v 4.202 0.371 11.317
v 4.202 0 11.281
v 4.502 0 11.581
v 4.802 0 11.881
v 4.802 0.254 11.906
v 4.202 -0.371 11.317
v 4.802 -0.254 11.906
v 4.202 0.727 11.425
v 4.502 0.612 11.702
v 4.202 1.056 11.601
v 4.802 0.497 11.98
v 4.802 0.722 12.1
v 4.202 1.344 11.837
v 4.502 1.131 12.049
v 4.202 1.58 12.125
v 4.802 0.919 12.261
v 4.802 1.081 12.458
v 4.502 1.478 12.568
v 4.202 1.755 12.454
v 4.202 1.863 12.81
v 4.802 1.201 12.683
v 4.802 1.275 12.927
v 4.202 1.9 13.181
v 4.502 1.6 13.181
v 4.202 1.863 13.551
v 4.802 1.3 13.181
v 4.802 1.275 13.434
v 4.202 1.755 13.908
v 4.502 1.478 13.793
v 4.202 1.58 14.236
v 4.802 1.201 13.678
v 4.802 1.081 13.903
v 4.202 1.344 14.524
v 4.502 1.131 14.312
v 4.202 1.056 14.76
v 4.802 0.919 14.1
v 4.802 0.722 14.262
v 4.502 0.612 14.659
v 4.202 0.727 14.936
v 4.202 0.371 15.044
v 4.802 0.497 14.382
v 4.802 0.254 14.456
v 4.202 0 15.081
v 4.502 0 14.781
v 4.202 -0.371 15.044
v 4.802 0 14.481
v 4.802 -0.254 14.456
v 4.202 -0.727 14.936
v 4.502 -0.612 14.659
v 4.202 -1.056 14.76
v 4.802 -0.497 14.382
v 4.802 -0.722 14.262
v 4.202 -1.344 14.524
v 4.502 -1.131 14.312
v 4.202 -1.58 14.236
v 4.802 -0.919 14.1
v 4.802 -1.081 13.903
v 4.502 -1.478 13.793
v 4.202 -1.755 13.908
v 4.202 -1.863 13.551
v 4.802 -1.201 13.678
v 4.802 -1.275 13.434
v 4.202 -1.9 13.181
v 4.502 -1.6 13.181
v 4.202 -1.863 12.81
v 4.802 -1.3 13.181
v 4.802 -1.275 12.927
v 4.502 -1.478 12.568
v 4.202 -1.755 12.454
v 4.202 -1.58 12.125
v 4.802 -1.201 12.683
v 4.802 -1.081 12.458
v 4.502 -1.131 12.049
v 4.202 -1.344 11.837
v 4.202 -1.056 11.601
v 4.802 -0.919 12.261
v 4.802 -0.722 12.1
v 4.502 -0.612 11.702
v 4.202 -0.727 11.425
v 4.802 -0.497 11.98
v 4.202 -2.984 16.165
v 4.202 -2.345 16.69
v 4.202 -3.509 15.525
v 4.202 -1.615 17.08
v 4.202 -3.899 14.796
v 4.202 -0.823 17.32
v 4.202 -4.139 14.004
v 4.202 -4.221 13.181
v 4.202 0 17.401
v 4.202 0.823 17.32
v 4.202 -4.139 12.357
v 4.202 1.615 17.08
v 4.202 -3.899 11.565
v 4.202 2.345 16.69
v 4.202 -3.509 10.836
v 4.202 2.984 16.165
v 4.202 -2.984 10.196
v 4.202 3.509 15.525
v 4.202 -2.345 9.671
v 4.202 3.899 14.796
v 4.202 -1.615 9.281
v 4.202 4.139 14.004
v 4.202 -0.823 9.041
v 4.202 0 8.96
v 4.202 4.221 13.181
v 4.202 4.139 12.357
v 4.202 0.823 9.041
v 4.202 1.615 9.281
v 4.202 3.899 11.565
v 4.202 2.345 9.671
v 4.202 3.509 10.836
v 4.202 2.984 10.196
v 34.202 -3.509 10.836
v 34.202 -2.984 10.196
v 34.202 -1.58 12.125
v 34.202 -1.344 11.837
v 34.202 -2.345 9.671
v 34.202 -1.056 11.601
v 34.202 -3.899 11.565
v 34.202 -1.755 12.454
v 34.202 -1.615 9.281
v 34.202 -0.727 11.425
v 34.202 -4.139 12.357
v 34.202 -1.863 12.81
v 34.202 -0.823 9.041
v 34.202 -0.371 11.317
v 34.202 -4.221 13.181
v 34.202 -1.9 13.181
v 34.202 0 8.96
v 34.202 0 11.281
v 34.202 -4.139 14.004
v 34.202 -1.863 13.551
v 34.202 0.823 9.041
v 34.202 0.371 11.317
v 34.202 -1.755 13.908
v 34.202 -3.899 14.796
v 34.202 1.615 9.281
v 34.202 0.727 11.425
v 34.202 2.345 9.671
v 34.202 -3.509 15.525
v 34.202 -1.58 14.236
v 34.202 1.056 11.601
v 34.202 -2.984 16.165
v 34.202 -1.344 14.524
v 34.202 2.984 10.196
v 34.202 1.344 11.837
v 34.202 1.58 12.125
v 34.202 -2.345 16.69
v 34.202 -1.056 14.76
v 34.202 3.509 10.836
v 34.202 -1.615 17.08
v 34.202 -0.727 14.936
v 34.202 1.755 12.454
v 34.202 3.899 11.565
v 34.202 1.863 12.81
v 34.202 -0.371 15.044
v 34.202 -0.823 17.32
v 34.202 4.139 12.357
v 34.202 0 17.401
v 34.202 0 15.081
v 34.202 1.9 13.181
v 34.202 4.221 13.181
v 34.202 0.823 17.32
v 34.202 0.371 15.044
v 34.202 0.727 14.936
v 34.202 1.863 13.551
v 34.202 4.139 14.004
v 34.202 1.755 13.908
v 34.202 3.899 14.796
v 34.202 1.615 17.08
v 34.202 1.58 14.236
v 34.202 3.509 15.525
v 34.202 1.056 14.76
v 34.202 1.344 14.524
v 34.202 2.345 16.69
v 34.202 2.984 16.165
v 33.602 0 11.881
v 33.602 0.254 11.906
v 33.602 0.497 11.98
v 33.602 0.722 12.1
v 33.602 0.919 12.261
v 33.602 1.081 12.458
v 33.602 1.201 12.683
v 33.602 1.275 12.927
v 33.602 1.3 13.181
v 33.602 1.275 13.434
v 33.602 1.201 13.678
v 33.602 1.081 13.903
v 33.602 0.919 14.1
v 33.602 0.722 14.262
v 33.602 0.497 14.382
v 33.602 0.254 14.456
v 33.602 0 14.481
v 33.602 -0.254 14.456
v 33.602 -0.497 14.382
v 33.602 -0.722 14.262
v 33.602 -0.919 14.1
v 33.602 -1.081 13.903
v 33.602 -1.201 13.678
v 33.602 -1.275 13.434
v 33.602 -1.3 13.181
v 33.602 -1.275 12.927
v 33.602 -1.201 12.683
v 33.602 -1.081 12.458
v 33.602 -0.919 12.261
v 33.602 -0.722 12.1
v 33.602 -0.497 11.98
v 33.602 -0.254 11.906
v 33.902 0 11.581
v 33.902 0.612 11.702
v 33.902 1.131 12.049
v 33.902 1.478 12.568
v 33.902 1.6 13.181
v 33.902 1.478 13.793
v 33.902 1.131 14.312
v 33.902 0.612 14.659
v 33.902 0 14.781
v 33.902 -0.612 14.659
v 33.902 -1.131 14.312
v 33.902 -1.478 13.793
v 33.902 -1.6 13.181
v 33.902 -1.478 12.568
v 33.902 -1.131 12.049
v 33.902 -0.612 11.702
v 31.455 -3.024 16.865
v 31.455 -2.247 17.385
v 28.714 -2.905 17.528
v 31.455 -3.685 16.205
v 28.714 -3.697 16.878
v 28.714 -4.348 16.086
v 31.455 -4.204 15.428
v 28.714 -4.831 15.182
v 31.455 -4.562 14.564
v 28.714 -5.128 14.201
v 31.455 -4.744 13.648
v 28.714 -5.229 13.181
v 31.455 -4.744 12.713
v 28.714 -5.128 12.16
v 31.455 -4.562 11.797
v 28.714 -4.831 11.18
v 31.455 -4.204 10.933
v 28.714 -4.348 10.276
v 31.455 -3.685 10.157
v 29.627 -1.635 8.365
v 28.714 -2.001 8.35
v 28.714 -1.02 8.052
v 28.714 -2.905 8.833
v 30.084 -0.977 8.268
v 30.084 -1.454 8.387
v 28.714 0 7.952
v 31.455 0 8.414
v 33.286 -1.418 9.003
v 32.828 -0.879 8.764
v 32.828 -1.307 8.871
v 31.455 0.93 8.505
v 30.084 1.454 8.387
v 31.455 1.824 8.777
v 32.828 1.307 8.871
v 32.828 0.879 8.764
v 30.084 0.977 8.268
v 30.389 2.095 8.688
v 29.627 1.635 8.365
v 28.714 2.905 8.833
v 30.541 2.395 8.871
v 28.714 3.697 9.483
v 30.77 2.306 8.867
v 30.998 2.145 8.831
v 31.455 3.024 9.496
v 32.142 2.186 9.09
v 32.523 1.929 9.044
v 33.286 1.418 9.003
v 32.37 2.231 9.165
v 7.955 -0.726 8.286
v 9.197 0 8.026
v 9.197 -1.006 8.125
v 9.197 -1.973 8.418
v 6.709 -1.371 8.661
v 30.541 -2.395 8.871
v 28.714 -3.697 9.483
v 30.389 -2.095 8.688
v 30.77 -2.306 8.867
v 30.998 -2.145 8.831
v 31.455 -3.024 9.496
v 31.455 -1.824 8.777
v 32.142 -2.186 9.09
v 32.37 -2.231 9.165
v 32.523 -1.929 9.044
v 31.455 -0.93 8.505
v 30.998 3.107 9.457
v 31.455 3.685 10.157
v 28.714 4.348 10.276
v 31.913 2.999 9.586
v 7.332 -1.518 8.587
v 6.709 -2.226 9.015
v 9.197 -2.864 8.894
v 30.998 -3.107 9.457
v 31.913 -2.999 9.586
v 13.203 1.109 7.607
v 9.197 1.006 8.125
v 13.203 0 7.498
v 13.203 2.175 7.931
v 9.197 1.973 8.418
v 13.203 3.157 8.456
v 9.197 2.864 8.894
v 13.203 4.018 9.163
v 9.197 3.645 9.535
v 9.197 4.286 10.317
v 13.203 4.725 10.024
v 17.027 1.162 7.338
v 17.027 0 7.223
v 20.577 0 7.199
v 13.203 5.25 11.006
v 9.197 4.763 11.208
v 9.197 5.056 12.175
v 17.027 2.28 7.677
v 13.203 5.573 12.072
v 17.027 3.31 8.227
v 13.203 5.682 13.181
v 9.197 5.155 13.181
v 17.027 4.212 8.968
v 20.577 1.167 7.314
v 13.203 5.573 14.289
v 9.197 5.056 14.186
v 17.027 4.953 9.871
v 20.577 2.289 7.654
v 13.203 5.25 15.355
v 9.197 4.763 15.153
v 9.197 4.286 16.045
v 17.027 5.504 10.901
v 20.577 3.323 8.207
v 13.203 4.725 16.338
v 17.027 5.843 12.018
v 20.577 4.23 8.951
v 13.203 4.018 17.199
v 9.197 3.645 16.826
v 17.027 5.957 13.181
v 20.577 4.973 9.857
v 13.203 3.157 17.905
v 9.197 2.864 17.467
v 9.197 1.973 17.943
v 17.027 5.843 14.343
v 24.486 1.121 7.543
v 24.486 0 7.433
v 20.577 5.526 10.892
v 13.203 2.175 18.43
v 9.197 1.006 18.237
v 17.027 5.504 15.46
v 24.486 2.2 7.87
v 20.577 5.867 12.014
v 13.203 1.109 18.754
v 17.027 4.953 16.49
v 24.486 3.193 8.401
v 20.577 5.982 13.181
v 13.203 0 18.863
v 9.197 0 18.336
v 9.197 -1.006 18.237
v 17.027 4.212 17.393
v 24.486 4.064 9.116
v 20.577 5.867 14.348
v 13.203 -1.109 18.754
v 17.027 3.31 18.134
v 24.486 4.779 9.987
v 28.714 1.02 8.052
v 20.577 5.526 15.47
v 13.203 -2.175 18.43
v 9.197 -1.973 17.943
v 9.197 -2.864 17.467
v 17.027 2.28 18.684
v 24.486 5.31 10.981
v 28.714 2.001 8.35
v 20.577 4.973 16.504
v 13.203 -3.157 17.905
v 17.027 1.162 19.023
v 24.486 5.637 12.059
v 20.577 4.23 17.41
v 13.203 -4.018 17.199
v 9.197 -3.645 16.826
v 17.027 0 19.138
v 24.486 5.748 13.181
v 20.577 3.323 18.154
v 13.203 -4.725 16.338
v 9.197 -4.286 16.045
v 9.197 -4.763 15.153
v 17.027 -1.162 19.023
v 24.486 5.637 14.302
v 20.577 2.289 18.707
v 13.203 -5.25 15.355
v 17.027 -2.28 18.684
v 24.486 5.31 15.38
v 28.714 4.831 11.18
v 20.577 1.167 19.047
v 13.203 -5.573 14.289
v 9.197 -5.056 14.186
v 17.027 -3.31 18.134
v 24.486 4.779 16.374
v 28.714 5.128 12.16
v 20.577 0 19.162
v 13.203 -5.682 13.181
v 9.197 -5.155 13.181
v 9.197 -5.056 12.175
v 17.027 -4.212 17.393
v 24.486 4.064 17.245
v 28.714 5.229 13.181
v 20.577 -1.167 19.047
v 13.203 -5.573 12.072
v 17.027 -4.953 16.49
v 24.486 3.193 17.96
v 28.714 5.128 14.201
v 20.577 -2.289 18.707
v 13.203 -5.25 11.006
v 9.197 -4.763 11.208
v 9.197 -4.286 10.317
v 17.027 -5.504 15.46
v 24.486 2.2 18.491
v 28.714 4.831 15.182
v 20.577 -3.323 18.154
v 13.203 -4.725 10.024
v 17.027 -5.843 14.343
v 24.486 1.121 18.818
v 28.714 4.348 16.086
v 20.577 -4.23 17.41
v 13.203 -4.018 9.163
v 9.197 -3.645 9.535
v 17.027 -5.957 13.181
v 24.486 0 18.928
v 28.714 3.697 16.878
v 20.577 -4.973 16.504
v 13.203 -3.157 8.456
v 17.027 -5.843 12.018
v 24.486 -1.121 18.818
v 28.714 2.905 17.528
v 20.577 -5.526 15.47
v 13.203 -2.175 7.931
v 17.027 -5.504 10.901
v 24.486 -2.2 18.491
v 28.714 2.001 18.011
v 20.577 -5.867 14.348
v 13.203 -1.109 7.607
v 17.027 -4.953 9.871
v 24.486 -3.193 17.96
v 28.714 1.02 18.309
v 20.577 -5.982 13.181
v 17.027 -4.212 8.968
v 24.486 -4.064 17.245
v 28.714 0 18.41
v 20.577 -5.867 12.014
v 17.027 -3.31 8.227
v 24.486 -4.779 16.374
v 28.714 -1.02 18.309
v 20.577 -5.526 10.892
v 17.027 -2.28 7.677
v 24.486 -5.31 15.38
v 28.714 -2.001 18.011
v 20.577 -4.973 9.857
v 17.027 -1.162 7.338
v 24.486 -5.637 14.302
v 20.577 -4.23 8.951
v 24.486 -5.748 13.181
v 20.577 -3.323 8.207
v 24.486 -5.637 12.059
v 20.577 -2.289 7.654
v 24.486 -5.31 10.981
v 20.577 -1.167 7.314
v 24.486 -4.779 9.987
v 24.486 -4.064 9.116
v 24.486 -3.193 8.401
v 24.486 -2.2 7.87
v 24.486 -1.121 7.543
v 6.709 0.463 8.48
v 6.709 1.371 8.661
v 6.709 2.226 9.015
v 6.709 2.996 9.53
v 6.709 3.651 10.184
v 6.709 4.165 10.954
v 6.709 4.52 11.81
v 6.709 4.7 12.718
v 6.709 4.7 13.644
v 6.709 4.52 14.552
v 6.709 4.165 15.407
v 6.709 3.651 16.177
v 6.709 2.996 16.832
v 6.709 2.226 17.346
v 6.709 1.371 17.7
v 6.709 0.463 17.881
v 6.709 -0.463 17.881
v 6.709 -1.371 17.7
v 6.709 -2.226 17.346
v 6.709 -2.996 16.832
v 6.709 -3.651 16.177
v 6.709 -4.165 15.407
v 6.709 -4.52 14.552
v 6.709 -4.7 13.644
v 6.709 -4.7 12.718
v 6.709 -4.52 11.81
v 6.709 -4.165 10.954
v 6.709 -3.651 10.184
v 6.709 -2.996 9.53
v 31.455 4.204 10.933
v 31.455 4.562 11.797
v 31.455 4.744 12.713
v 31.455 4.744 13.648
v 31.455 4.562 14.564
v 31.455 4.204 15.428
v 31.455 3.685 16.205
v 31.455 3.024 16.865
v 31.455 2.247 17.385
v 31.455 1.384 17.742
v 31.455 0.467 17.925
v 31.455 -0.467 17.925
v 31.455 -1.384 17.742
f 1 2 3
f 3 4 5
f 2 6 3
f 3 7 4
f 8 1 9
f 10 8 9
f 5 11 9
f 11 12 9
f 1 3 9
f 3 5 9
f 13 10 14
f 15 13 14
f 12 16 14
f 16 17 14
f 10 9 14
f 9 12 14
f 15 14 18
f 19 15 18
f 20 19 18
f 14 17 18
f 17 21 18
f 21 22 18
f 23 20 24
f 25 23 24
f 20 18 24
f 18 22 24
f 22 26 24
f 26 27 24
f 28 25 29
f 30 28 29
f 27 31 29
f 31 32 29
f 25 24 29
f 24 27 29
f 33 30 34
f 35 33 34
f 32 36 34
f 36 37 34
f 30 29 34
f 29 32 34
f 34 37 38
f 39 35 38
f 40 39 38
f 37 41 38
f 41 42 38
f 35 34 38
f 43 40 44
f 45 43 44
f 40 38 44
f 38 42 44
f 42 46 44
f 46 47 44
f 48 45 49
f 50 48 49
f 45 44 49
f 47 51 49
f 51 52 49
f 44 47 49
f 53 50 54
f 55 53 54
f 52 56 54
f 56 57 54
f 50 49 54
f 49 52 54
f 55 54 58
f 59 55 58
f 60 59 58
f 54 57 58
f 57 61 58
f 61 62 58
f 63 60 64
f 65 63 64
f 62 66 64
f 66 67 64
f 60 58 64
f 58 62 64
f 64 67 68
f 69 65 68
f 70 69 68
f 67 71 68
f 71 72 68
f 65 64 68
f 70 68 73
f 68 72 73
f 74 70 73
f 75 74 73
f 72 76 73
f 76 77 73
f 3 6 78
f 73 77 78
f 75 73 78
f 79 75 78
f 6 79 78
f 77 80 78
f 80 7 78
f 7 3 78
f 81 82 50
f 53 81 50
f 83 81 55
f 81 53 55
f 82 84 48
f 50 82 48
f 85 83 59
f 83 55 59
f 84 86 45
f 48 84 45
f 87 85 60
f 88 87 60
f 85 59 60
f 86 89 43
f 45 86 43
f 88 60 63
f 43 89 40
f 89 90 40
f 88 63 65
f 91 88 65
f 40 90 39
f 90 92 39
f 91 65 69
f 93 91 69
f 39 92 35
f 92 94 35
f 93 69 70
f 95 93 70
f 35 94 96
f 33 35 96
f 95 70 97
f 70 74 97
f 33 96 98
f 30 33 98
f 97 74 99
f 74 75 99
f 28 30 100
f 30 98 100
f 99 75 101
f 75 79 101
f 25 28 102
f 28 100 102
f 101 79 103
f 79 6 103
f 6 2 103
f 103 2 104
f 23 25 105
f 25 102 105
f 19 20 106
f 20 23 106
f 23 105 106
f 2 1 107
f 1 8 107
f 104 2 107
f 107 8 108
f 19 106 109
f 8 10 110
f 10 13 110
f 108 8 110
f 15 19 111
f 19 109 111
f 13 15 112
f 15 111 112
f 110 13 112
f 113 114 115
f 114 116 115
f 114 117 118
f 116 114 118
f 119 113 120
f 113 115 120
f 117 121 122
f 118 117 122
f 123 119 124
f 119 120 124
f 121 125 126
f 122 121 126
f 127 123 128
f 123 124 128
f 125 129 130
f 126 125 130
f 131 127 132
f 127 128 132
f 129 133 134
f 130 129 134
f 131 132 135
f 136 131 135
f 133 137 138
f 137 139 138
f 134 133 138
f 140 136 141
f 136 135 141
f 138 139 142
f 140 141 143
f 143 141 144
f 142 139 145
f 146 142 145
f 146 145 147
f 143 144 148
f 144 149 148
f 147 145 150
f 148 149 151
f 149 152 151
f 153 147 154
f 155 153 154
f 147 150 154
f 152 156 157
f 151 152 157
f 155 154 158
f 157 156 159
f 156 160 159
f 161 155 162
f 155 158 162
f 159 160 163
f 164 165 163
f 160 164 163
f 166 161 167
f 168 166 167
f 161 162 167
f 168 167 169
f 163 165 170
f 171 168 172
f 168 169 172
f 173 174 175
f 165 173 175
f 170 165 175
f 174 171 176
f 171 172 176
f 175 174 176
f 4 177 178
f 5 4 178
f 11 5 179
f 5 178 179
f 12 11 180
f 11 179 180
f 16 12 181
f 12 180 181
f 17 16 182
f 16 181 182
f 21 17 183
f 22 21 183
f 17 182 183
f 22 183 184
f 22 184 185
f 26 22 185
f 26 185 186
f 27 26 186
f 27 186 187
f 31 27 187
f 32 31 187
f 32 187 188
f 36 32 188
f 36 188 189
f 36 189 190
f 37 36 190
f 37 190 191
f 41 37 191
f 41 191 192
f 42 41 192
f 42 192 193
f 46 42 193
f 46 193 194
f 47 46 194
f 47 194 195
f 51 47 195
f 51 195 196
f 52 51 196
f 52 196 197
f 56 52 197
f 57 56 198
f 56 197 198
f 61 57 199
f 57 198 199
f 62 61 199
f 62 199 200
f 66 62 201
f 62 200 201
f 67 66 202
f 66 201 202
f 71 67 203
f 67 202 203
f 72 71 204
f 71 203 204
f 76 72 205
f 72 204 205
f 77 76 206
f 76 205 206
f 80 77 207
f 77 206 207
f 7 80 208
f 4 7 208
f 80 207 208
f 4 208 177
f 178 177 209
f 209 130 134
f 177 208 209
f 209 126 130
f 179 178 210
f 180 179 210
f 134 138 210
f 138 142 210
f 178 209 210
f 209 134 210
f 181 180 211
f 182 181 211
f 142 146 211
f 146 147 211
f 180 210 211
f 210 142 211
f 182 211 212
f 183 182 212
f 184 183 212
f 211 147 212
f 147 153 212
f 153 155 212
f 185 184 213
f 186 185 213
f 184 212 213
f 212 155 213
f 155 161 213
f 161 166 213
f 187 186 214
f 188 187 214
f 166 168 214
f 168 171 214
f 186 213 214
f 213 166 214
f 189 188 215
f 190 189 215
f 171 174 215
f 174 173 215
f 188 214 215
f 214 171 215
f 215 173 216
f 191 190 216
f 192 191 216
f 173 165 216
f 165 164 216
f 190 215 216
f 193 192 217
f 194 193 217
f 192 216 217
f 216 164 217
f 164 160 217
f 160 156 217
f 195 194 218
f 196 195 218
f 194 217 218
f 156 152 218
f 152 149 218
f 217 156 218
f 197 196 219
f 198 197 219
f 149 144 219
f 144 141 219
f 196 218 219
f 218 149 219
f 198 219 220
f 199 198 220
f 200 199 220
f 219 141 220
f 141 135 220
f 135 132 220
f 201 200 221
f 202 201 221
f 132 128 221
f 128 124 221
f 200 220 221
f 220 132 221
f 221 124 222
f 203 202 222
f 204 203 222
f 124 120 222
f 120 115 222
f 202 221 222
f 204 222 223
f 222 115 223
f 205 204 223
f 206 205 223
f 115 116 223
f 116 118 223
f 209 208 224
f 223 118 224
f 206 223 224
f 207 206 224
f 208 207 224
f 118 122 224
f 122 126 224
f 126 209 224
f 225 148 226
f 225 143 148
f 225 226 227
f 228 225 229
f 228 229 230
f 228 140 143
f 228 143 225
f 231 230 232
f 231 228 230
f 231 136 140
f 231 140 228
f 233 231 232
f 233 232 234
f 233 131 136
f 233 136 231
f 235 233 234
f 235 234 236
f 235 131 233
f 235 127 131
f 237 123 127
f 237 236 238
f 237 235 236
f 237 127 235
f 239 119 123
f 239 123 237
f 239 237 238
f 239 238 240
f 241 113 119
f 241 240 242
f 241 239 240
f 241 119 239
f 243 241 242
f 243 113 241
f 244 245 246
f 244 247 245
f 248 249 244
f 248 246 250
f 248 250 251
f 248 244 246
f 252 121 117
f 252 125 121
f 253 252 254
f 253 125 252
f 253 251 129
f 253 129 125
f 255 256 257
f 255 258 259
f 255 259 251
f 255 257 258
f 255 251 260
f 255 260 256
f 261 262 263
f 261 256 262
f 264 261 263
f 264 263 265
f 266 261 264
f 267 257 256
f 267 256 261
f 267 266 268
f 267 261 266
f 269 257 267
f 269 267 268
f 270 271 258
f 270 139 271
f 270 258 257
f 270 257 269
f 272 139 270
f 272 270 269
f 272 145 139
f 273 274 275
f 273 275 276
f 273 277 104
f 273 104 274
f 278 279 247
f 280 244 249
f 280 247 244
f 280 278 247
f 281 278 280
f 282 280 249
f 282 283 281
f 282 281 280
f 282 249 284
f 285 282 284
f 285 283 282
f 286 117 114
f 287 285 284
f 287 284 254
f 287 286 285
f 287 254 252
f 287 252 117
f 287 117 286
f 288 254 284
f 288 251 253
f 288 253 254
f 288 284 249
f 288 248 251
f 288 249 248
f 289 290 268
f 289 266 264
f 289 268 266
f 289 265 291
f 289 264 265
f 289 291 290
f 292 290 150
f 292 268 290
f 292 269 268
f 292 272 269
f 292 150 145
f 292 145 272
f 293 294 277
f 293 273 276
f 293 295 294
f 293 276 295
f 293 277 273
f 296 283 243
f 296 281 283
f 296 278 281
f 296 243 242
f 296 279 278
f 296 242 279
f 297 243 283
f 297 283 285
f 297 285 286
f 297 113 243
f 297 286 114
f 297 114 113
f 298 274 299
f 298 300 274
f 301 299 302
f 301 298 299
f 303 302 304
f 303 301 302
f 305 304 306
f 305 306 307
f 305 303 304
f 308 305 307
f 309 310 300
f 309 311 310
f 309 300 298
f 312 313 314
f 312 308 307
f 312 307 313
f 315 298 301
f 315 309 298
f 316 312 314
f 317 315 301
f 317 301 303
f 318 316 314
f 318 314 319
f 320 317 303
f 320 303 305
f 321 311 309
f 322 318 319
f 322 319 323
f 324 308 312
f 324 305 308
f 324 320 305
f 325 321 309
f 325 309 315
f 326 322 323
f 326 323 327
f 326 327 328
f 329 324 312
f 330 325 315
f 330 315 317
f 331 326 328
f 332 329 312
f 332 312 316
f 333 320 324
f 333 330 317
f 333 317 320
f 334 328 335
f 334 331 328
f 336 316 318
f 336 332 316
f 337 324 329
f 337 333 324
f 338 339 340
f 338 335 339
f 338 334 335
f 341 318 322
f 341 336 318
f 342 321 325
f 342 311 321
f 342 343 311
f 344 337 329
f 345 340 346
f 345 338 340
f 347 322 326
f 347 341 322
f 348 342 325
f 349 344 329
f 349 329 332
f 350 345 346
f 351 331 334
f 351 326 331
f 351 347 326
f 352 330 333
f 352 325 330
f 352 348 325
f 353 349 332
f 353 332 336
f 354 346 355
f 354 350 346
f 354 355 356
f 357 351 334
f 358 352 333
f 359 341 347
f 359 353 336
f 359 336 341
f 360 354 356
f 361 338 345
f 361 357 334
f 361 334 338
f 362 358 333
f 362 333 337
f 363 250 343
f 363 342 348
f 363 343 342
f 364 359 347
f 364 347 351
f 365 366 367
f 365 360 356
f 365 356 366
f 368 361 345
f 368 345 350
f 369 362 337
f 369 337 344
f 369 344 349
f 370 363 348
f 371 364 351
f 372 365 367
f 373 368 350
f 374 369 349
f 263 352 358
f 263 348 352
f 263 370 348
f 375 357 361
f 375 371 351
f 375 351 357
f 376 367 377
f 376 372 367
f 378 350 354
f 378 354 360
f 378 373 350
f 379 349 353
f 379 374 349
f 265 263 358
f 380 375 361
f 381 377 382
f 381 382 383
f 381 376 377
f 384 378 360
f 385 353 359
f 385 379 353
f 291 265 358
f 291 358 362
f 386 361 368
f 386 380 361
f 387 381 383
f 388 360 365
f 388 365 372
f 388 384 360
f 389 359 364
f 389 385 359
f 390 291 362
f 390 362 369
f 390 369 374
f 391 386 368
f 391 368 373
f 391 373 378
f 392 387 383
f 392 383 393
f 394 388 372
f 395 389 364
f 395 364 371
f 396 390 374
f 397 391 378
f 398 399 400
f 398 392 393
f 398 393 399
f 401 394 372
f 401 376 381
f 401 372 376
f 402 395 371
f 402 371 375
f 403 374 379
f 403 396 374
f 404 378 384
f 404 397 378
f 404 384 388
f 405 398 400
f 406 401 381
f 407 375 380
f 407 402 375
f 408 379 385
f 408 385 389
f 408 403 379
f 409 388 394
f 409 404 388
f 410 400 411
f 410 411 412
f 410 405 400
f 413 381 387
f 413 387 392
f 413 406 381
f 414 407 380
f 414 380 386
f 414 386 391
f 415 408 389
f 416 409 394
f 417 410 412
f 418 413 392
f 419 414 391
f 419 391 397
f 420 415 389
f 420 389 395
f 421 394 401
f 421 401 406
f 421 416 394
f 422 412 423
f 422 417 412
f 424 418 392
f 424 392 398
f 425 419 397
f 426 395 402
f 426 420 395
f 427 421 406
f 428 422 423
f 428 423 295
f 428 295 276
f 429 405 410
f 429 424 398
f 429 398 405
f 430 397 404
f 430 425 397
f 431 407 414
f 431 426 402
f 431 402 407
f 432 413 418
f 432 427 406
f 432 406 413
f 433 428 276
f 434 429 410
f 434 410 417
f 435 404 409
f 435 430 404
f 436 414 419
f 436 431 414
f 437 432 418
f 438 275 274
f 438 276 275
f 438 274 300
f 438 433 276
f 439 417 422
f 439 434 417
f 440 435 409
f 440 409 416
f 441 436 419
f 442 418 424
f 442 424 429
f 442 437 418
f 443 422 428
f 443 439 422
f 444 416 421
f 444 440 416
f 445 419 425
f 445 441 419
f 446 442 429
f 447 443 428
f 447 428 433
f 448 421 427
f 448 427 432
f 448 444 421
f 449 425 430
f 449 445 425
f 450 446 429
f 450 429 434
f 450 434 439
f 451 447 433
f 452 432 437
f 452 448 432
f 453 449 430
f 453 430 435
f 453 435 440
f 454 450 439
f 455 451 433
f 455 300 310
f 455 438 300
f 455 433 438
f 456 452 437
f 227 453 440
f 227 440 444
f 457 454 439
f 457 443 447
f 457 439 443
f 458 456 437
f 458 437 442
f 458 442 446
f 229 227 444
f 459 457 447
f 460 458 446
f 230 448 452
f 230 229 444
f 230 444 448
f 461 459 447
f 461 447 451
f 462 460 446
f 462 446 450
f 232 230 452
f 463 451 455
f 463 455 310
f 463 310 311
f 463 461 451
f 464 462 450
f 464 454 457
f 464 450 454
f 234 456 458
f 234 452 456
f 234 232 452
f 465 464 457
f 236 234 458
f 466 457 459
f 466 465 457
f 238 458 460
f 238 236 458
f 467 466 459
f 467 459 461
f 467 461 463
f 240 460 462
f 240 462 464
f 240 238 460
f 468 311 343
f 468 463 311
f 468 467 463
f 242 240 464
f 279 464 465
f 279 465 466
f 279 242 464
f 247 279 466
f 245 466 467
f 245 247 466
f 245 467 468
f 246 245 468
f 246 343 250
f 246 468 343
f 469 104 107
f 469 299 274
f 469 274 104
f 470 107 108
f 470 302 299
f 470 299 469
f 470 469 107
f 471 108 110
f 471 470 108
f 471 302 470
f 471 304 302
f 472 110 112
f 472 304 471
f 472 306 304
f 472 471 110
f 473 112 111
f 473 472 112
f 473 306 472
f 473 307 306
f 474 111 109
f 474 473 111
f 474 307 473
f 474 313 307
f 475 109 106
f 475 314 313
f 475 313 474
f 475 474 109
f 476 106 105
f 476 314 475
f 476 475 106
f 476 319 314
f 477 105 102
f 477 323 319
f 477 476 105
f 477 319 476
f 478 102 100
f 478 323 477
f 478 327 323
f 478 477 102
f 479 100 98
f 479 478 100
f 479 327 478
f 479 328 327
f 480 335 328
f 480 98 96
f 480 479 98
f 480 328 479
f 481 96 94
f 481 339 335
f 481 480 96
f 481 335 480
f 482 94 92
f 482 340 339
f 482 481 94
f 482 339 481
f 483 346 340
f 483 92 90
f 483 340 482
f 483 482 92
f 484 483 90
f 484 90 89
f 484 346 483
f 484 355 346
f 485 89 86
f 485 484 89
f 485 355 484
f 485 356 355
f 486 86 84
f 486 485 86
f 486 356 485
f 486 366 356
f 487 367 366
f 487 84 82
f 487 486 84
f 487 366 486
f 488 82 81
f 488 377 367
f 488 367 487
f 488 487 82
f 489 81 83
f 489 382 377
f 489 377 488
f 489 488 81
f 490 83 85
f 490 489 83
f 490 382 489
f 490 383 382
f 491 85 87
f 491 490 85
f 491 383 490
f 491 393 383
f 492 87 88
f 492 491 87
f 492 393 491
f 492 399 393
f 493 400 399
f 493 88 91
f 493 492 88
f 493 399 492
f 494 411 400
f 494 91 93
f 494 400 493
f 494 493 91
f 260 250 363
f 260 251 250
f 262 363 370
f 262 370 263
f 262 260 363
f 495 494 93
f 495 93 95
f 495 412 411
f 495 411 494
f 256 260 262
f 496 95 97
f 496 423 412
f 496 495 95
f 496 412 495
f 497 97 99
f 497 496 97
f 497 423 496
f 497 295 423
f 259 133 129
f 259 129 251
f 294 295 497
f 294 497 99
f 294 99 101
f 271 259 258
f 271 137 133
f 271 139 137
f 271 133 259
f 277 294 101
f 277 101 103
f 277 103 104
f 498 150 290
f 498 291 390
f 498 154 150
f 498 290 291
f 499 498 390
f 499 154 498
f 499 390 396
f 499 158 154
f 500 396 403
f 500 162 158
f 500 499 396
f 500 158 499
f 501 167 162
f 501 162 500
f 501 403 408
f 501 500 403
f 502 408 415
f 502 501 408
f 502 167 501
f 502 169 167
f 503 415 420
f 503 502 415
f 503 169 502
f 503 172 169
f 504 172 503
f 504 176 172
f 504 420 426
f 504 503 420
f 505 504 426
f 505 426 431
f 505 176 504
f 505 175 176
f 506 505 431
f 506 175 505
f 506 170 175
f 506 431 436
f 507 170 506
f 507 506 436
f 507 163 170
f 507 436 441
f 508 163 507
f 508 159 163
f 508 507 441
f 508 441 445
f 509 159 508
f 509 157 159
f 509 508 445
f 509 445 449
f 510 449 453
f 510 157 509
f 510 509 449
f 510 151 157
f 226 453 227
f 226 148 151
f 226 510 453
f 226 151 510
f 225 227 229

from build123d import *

# Parameters (mm, degrees)
SKETCH_2_R          = 1.3
CUT_EXTRUDE_1_DEPTH = 37.109501957
CHAMFER_1_SIZE      = 0.6


with BuildPart() as part:
    # 草图1 → 旋转1 (revolve)
    with BuildSketch(Plane(origin=(0, 0, 0), x_dir=(1, 0, 0), z_dir=(0, 1, 0))):
        with BuildLine():
            Line((4.202250373, -8.960092976), (4.202250373, -13.180607295))
            Line((4.202250373, -13.180607295), (34.202250373, -13.180607295))
            Line((34.202250373, -13.180607295), (34.202250373, -8.960092976))
            add(Edge.make_bspline(
                [(4.202250373, -8.960092976), (9.281734141, -7.880415372), (19.175765631, -6.475169713), (29.17573609, -7.891674383), (34.202250373, -8.960092976)],
                knots=[0, 0, 0, 0, 0.5, 1, 1, 1, 1], degree=3))
        make_face()
    revolve(axis=Axis((4.202250373, 0, 13.180607295), (1, 0, 0)))

    # 草图2 → 切除-拉伸1 (cut, through all)
    with BuildSketch(Plane(origin=(34.202250373, 0, 0), x_dir=(0, 0, -1), z_dir=(1, 0, 0))):
        with Locations((-13.180607295, 0)):
            Circle(SKETCH_2_R)
    extrude(amount=-CUT_EXTRUDE_1_DEPTH, mode=Mode.SUBTRACT)

    # 倒角1
    chamfer_1_edges = [part.edges().sort_by_distance(p)[0] for p in [
        (4.202250373, 0, 14.480607295),
        (34.202250373, 0, 14.480607295),
    ]]
    chamfer(chamfer_1_edges, length=CHAMFER_1_SIZE)


solid = part.part
